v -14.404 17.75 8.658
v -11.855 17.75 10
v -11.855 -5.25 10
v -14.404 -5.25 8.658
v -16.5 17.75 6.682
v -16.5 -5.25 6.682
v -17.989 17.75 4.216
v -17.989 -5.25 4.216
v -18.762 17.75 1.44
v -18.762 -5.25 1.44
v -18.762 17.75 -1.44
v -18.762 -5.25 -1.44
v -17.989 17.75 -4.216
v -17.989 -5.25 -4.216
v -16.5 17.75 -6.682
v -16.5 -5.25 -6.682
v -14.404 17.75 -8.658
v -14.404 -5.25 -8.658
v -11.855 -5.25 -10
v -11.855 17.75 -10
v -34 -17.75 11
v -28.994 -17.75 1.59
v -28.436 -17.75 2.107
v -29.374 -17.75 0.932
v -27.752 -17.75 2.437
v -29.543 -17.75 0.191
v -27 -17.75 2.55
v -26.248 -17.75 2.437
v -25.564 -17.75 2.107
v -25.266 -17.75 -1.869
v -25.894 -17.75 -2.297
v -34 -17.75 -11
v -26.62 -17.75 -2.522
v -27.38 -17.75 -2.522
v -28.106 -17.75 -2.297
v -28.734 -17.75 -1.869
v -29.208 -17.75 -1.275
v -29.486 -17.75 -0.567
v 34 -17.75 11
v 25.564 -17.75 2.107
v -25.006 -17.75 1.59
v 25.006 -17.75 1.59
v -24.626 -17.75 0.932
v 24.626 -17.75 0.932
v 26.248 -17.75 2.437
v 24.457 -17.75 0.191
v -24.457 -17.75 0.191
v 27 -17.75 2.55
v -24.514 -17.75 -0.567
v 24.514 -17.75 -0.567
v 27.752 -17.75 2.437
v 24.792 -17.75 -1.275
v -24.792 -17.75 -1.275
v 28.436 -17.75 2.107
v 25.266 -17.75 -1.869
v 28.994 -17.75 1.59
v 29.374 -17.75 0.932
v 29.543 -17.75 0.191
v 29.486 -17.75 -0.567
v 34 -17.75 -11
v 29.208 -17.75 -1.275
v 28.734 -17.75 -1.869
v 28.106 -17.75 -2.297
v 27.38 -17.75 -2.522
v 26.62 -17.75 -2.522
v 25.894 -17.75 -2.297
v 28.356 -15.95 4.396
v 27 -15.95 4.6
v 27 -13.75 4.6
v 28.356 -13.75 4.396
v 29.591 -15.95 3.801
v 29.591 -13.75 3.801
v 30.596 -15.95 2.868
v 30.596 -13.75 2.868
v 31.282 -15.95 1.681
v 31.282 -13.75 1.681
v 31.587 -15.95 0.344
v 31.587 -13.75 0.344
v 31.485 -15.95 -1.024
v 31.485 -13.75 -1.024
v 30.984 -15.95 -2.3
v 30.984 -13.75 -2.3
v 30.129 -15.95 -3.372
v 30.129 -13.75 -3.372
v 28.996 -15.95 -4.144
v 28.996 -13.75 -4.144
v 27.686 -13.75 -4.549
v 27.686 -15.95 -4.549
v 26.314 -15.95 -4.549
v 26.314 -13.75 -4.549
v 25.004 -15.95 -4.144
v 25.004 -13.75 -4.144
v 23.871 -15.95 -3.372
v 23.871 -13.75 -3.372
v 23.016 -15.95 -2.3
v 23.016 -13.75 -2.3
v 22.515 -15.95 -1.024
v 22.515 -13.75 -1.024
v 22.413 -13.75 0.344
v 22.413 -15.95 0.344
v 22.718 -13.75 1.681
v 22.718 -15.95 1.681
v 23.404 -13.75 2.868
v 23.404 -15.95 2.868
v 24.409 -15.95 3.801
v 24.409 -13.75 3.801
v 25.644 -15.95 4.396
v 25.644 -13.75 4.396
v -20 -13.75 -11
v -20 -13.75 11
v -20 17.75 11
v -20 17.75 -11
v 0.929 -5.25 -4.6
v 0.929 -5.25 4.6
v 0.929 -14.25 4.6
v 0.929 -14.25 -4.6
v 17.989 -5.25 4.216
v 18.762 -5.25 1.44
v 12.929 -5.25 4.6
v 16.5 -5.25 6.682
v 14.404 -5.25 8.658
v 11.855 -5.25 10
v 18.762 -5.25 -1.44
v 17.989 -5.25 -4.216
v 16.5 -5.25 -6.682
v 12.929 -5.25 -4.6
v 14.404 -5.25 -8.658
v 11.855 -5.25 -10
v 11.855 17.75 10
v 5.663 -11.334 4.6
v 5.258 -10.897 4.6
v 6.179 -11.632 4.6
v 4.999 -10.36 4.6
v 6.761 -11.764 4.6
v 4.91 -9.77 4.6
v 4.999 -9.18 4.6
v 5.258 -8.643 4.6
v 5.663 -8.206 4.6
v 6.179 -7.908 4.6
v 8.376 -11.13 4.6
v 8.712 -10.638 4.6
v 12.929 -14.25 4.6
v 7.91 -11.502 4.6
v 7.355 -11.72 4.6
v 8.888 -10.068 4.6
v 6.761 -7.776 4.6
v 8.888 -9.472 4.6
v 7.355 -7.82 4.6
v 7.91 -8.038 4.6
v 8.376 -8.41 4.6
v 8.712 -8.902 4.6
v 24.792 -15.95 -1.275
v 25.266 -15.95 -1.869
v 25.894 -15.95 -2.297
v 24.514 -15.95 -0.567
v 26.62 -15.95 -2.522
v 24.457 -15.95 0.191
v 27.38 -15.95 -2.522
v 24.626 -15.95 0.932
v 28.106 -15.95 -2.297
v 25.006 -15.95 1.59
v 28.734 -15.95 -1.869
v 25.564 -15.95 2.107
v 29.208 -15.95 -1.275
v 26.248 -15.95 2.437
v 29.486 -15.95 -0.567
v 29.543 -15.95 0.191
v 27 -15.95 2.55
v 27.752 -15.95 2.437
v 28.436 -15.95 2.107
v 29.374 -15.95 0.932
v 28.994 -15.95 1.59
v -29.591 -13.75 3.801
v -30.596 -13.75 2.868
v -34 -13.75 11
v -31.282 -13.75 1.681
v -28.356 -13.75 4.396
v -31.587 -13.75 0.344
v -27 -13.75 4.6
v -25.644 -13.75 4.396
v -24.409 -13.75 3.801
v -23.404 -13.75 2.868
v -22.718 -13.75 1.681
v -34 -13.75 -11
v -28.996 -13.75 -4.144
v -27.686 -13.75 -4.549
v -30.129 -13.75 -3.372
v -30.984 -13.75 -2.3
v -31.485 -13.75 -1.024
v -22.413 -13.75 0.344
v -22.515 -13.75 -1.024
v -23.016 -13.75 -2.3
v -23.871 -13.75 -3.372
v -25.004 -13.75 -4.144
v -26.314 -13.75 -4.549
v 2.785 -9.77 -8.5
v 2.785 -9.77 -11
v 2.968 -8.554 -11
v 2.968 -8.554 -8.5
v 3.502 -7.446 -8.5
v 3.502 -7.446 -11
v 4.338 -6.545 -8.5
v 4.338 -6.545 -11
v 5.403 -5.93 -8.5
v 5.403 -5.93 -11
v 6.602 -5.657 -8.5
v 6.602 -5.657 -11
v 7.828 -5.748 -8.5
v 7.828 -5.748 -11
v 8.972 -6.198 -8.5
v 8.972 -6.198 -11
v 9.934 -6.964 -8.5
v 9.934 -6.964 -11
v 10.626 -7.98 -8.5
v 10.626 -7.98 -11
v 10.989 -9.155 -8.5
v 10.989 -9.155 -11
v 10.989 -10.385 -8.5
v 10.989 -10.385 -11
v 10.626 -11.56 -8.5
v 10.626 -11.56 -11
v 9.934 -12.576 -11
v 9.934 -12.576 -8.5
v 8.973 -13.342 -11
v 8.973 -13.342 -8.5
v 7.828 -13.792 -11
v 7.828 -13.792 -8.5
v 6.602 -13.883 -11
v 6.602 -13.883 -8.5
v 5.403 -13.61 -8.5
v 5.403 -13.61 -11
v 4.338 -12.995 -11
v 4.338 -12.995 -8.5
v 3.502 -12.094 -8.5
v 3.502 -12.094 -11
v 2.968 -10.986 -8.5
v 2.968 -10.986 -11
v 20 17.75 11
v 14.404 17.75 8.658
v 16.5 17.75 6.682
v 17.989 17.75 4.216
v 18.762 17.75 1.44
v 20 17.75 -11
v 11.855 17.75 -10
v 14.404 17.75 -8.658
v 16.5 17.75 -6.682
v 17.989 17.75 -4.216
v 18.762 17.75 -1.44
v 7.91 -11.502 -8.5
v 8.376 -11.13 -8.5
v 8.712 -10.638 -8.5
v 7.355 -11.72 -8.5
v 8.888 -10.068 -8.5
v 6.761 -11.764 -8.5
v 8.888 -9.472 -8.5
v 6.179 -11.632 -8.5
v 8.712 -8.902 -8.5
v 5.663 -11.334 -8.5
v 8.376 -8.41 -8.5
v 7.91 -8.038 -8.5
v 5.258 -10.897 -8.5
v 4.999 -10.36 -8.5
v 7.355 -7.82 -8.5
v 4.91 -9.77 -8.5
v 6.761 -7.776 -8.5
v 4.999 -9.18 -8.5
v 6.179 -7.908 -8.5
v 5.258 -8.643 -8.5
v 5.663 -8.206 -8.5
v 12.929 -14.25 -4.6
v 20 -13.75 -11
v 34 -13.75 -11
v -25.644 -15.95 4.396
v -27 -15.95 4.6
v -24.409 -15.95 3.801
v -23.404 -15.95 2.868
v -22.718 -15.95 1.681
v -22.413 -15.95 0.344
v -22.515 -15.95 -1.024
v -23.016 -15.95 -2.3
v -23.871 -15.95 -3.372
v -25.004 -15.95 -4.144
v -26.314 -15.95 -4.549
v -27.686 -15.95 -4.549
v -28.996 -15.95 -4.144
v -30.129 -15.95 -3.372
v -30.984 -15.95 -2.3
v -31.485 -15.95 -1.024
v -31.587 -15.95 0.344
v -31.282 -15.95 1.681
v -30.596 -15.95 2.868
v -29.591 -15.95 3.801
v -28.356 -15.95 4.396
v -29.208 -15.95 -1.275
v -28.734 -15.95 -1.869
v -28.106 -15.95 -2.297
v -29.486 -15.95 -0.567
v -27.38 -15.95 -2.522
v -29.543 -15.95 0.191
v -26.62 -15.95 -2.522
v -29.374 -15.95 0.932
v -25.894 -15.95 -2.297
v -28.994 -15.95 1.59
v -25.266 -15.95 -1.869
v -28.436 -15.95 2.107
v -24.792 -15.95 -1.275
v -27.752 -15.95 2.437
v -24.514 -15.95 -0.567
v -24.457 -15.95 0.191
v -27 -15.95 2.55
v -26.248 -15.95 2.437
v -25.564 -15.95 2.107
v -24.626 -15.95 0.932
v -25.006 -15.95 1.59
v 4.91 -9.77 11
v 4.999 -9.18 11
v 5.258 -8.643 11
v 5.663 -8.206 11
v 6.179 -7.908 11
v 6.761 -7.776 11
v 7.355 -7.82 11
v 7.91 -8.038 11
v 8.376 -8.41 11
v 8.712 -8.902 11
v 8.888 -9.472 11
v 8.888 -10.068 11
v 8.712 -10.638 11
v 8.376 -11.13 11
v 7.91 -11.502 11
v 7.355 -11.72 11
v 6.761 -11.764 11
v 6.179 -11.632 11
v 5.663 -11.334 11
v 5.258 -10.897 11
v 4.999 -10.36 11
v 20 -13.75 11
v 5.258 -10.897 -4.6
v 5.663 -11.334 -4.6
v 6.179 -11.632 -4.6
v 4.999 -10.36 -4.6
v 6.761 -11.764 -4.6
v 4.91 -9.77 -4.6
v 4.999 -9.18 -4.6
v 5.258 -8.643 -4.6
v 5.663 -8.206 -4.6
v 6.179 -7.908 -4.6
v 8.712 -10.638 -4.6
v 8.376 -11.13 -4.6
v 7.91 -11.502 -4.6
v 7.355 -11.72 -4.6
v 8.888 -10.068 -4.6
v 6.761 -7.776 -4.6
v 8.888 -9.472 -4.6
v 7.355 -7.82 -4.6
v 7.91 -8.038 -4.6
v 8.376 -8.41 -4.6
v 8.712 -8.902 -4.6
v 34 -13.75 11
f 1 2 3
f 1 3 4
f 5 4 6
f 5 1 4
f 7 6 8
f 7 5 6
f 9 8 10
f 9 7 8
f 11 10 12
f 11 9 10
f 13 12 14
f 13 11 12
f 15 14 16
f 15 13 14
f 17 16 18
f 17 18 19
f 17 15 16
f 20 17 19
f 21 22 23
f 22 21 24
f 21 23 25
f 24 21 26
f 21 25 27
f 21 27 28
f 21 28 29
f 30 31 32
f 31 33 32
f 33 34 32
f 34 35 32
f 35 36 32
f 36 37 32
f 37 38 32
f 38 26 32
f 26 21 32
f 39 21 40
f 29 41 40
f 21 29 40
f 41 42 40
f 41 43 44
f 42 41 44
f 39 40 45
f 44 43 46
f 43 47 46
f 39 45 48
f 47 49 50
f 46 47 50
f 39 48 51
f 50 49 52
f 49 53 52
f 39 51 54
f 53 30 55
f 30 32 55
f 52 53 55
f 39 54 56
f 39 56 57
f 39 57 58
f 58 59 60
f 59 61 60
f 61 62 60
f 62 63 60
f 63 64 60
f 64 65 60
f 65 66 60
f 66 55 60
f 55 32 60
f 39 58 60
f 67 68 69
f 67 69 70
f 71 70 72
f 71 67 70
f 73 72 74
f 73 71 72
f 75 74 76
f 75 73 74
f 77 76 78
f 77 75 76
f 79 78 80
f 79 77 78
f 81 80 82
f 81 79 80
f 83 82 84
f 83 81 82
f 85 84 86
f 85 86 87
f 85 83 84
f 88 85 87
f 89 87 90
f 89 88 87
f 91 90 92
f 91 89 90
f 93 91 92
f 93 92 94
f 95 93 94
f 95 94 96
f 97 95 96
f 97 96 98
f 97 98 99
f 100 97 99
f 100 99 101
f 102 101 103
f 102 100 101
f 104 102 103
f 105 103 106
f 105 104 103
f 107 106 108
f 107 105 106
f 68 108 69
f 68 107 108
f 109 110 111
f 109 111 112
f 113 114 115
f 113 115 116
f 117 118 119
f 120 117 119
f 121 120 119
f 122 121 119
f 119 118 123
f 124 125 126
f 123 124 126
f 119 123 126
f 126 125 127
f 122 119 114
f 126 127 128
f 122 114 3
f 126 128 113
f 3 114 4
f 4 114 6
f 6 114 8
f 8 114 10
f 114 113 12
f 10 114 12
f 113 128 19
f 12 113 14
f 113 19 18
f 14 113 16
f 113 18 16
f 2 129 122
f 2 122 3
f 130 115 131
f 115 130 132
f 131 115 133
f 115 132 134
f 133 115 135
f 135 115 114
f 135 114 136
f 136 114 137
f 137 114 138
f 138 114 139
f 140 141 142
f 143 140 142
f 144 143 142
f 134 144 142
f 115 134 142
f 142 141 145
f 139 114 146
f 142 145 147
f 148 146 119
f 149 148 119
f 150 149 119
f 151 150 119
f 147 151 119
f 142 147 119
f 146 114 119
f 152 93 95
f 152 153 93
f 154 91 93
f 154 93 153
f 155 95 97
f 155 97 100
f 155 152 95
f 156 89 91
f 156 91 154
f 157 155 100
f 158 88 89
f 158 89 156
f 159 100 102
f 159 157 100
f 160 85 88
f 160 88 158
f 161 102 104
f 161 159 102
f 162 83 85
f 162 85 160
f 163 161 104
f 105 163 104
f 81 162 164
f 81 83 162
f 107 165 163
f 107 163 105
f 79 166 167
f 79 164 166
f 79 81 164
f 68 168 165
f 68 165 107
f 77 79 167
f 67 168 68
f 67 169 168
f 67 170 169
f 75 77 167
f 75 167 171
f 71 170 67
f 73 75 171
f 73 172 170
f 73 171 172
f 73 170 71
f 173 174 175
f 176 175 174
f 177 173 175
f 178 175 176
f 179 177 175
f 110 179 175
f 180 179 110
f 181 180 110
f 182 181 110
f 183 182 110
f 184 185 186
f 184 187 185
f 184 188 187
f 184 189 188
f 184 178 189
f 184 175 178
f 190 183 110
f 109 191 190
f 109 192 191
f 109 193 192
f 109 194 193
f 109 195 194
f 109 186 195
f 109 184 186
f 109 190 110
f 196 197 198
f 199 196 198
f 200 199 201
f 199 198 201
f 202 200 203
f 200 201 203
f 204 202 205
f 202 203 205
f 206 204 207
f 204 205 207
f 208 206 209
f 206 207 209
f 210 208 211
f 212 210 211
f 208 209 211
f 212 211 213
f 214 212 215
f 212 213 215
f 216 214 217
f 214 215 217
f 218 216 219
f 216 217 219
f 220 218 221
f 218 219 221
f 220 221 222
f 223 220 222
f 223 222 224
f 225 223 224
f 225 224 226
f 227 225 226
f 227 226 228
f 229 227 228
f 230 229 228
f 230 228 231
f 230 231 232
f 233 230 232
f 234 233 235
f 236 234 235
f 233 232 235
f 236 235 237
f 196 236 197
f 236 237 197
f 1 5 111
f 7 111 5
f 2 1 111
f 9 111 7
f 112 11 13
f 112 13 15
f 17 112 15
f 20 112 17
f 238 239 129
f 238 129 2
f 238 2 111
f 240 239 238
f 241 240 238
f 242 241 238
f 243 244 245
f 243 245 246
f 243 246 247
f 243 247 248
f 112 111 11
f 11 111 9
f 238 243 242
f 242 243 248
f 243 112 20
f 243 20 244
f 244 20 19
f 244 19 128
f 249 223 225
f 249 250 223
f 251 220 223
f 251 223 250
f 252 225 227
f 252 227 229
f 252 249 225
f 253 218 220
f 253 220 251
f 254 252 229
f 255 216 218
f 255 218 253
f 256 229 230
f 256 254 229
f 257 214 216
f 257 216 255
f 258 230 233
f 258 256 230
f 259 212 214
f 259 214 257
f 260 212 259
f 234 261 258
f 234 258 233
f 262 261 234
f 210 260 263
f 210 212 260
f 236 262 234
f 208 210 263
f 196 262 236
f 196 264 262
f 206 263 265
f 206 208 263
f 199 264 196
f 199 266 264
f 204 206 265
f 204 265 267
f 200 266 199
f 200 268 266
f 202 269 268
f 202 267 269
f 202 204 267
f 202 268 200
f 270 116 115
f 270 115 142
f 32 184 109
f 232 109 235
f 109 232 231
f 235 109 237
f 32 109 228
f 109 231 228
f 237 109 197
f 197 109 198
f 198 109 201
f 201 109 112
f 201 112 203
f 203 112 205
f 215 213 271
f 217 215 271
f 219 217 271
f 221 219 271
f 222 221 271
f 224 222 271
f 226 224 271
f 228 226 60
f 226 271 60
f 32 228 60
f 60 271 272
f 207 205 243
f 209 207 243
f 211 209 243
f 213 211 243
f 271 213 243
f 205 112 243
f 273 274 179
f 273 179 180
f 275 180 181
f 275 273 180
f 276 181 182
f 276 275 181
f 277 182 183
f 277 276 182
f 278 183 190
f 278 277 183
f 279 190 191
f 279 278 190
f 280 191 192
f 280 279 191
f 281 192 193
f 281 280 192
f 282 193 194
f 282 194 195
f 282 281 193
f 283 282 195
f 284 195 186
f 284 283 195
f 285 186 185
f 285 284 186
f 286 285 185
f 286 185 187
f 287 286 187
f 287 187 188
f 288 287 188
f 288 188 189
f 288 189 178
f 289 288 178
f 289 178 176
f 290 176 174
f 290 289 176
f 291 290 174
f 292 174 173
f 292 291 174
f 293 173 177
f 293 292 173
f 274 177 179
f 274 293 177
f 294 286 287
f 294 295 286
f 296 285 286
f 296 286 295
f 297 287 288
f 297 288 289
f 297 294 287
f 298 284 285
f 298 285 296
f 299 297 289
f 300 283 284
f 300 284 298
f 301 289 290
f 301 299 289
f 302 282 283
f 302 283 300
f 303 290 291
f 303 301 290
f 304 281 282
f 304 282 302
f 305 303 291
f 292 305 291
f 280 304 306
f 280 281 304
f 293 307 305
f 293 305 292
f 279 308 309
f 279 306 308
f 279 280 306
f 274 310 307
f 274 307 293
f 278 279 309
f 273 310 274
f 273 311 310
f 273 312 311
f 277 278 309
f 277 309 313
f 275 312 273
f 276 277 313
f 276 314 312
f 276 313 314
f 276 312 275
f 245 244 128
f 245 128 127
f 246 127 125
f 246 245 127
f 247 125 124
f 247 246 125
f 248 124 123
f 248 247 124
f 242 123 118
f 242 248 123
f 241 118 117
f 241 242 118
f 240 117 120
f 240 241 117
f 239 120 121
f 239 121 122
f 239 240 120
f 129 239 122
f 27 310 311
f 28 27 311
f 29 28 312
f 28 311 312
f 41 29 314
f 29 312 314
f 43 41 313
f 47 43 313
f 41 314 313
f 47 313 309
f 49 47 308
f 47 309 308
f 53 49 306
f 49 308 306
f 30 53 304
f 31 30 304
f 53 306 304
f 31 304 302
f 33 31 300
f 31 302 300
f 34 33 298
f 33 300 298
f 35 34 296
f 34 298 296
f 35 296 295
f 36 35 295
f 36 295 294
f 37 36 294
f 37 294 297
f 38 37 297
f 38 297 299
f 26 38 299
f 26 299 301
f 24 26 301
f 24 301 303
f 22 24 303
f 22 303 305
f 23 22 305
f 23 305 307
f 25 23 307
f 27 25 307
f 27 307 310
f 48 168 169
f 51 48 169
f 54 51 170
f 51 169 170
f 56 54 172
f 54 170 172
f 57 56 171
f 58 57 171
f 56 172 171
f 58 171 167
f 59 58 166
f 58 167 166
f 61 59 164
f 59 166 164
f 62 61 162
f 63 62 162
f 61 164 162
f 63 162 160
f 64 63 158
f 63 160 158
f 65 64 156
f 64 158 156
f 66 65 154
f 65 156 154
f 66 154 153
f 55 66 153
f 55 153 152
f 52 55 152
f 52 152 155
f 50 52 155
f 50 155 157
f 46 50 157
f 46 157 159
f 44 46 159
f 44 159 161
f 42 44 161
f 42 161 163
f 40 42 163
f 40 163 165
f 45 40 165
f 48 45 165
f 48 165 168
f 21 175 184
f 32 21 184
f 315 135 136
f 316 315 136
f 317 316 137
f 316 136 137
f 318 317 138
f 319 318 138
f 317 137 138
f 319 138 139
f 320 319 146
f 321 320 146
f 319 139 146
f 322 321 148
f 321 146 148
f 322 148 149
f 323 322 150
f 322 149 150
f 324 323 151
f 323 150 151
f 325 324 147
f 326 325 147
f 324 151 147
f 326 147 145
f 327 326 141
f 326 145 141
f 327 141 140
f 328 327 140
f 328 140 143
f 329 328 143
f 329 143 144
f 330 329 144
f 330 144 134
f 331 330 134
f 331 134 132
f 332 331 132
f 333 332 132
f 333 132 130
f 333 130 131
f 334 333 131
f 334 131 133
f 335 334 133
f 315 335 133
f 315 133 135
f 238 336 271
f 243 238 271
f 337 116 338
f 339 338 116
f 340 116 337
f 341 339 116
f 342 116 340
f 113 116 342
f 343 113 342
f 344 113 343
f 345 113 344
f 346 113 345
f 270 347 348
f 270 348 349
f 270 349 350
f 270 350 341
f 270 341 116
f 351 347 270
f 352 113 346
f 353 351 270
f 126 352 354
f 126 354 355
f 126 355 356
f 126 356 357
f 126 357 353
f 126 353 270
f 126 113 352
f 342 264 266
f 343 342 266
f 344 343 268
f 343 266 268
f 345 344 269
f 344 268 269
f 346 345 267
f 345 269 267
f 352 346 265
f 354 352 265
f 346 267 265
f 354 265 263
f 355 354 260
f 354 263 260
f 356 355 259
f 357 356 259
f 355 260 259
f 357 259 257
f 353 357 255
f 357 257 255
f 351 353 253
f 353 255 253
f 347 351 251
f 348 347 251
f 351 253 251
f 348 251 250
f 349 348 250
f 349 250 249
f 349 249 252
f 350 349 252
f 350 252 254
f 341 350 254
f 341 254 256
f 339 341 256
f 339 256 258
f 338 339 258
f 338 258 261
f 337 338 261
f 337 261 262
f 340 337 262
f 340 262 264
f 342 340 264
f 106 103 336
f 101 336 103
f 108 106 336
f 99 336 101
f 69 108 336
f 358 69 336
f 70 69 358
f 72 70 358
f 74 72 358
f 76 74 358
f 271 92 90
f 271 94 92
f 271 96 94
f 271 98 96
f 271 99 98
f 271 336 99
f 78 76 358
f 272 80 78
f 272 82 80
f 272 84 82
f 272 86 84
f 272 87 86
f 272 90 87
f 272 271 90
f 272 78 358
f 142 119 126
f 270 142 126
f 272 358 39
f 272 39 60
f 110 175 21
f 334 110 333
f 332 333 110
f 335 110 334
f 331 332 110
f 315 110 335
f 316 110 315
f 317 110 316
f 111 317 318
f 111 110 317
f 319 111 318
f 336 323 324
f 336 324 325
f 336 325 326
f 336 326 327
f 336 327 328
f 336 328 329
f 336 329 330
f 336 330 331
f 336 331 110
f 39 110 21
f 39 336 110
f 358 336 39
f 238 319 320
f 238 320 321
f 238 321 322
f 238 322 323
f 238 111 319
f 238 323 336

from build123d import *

# Parameters (mm, degrees)
SKETCH1_W           = 14
SKETCH1_H           = 22
SKETCH1_R           = 4.6
SKETCH1_R_2         = 2.55
SKETCH1_W_2         = 40
SKETCH1_W_3         = 12
SKETCH1_H_2         = 9.2
BOSS_EXTRUDE1_DEPTH = 17.75
CUT_EXTRUDE1_START  = -13.75
SKETCH1_5_W         = 14
SKETCH1_5_H         = 22
SKETCH1_5_R         = 4.6
SKETCH1_5_R_2       = 2.55
CUT_EXTRUDE1_DEPTH  = 31.5
CUT_EXTRUDE2_START  = -15.95
SKETCH1_6_R         = 4.6
SKETCH1_6_R_2       = 2.55
CUT_EXTRUDE2_DEPTH  = 2.2
CUT_EXTRUDE3_START  = 17.75
SKETCH1_7_W         = 12
SKETCH1_7_H         = 9.2
CUT_EXTRUDE3_DEPTH  = 23
CUT_EXTRUDE4_START  = -5.25
SKETCH1_8_W         = 12
SKETCH1_8_H         = 9.2
CUT_EXTRUDE4_DEPTH  = 9
CUT_EXTRUDE5_REACH  = 46.216
SKETCH2_R           = 2
SKETCH2_3_R         = 4.125
CUT_EXTRUDE6_DEPTH  = 2.5


with BuildPart() as part:
    # Sketch1 → Boss-Extrude1 (new, symmetric)
    # profile 1 of 7: a face of its own
    with BuildSketch(Plane(origin=(0, 0, 0), x_dir=(1, 0, 0), z_dir=(0, 1, 0))):
        with Locations((-27, 0)):
            Rectangle(SKETCH1_W, SKETCH1_H)
        with Locations((-27, 0)):
            Circle(SKETCH1_R, mode=Mode.SUBTRACT)
    # profile 2 of 7: a face of its own
    with BuildSketch(Plane(origin=(0, 0, 0), x_dir=(1, 0, 0), z_dir=(0, 1, 0))):
        with Locations((-27, 0)):
            Circle(SKETCH1_R)
        with Locations(Location((-27, 0, 0), (0, 0, 270))):
            Circle(SKETCH1_R_2, mode=Mode.SUBTRACT)
    # profile 3 of 7: a face of its own
    with BuildSketch(Plane(origin=(0, 0, 0), x_dir=(1, 0, 0), z_dir=(0, 1, 0))):
        Rectangle(SKETCH1_W_2, SKETCH1_H)
        with BuildLine():
            Line((11.854501341, -10), (-11.854501341, -10))
            ThreePointArc((-11.854501341, -10), (-18.86, 0), (-11.854501341, 10))
            Line((-11.854501341, 10), (11.854501341, 10))
            ThreePointArc((11.854501341, 10), (18.86, 0), (11.854501341, -10))
        make_face(mode=Mode.SUBTRACT)
    # profile 4 of 7: a face of its own
    with BuildSketch(Plane(origin=(0, 0, 0), x_dir=(1, 0, 0), z_dir=(0, 1, 0))):
        with BuildLine():
            ThreePointArc((11.854501341, 10), (18.86, 0), (11.854501341, -10))
            Line((11.854501341, -10), (-11.854501341, -10))
            ThreePointArc((-11.854501341, -10), (-18.86, 0), (-11.854501341, 10))
            Line((-11.854501341, 10), (11.854501341, 10))
        make_face()
        with Locations((6.92918915, 0)):
            Rectangle(SKETCH1_W_3, SKETCH1_H_2, mode=Mode.SUBTRACT)
    # profile 5 of 7: a face of its own
    with BuildSketch(Plane(origin=(0, 0, 0), x_dir=(1, 0, 0), z_dir=(0, 1, 0))):
        with Locations((6.92918915, 0)):
            Rectangle(SKETCH1_W_3, SKETCH1_H_2)
    # profile 6 of 7: a face of its own
    with BuildSketch(Plane(origin=(0, 0, 0), x_dir=(1, 0, 0), z_dir=(0, 1, 0))):
        with Locations((27, 0)):
            Rectangle(SKETCH1_W, SKETCH1_H)
        with Locations((27, 0)):
            Circle(SKETCH1_R, mode=Mode.SUBTRACT)
    # profile 7 of 7: a face of its own
    with BuildSketch(Plane(origin=(0, 0, 0), x_dir=(1, 0, 0), z_dir=(0, 1, 0))):
        with Locations((27, 0)):
            Circle(SKETCH1_R)
        with Locations(Location((27, 0, 0), (0, 0, 270))):
            Circle(SKETCH1_R_2, mode=Mode.SUBTRACT)
    extrude(amount=BOSS_EXTRUDE1_DEPTH, both=True)

    # Sketch1<5> → Cut-Extrude1 (cut)
    # profile 1 of 4: a face of its own
    with BuildSketch(Plane(origin=(0, 0, 0), x_dir=(1, 0, 0), z_dir=(0, 1, 0)).offset(CUT_EXTRUDE1_START)):
        with Locations((-27, 0)):
            Rectangle(SKETCH1_5_W, SKETCH1_5_H)
        with Locations((-27, 0)):
            Circle(SKETCH1_5_R, mode=Mode.SUBTRACT)
    # profile 2 of 4: a face of its own
    with BuildSketch(Plane(origin=(0, 0, 0), x_dir=(1, 0, 0), z_dir=(0, 1, 0)).offset(CUT_EXTRUDE1_START)):
        with Locations((27, 0)):
            Rectangle(SKETCH1_5_W, SKETCH1_5_H)
        with Locations((27, 0)):
            Circle(SKETCH1_5_R, mode=Mode.SUBTRACT)
    # profile 3 of 4: a face of its own
    with BuildSketch(Plane(origin=(0, 0, 0), x_dir=(1, 0, 0), z_dir=(0, 1, 0)).offset(CUT_EXTRUDE1_START)):
        with Locations((-27, 0)):
            Circle(SKETCH1_5_R)
        with Locations(Location((-27, 0, 0), (0, 0, 270))):
            Circle(SKETCH1_5_R_2, mode=Mode.SUBTRACT)
    # profile 4 of 4: a face of its own
    with BuildSketch(Plane(origin=(0, 0, 0), x_dir=(1, 0, 0), z_dir=(0, 1, 0)).offset(CUT_EXTRUDE1_START)):
        with Locations((27, 0)):
            Circle(SKETCH1_5_R)
        with Locations(Location((27, 0, 0), (0, 0, 270))):
            Circle(SKETCH1_5_R_2, mode=Mode.SUBTRACT)
    extrude(amount=CUT_EXTRUDE1_DEPTH, mode=Mode.SUBTRACT)

    # Sketch1<6> → Cut-Extrude2 (cut)
    # profile 1 of 2: a face of its own
    with BuildSketch(Plane(origin=(0, 0, 0), x_dir=(1, 0, 0), z_dir=(0, 1, 0)).offset(CUT_EXTRUDE2_START)):
        with Locations(Location((-27, 0, 0), (0, 0, 270))):
            Circle(SKETCH1_6_R)
        with Locations(Location((-27, 0, 0), (0, 0, 270))):
            Circle(SKETCH1_6_R_2, mode=Mode.SUBTRACT)
    # profile 2 of 2: a face of its own
    with BuildSketch(Plane(origin=(0, 0, 0), x_dir=(1, 0, 0), z_dir=(0, 1, 0)).offset(CUT_EXTRUDE2_START)):
        with Locations(Location((27, 0, 0), (0, 0, 270))):
            Circle(SKETCH1_6_R)
        with Locations(Location((27, 0, 0), (0, 0, 270))):
            Circle(SKETCH1_6_R_2, mode=Mode.SUBTRACT)
    extrude(amount=CUT_EXTRUDE2_DEPTH, mode=Mode.SUBTRACT)

    # Sketch1<7> → Cut-Extrude3 (cut)
    # profile 1 of 2: a face of its own
    with BuildSketch(Plane(origin=(0, 0, 0), x_dir=(1, 0, 0), z_dir=(0, 1, 0)).offset(CUT_EXTRUDE3_START)):
        with BuildLine():
            ThreePointArc((11.854501341, 10), (18.86, 0), (11.854501341, -10))
            Line((11.854501341, -10), (-11.854501341, -10))
            ThreePointArc((-11.854501341, -10), (-18.86, 0), (-11.854501341, 10))
            Line((-11.854501341, 10), (11.854501341, 10))
        make_face()
        with Locations((6.92918915, 0)):
            Rectangle(SKETCH1_7_W, SKETCH1_7_H, mode=Mode.SUBTRACT)
    # profile 2 of 2: a face of its own
    with BuildSketch(Plane(origin=(0, 0, 0), x_dir=(1, 0, 0), z_dir=(0, 1, 0)).offset(CUT_EXTRUDE3_START)):
        with Locations((6.92918915, 0)):
            Rectangle(SKETCH1_7_W, SKETCH1_7_H)
    extrude(amount=-CUT_EXTRUDE3_DEPTH, mode=Mode.SUBTRACT)

    # Sketch1<8> → Cut-Extrude4 (cut)
    with BuildSketch(Plane(origin=(0, 0, 0), x_dir=(1, 0, 0), z_dir=(0, 1, 0)).offset(CUT_EXTRUDE4_START)):
        with Locations((6.92918915, 0)):
            Rectangle(SKETCH1_8_W, SKETCH1_8_H)
    extrude(amount=-CUT_EXTRUDE4_DEPTH, mode=Mode.SUBTRACT)

    # Cut-Extrude5: up to this face of the body (flat: up to its plane)
    cut_extrude5_end = Plane(part.part.faces().sort_by_distance((0, -1.151436031, 11))[0])
    # Sketch2 → Cut-Extrude5 (cut, up to the picked face)
    with BuildSketch(Plane(origin=(0, 0, -11), x_dir=(-1, 0, 0), z_dir=(0, 0, -1)), mode=Mode.PRIVATE) as cut_extrude5_sk1:
        with Locations((-6.91, -9.77)):
            Circle(SKETCH2_R)
    cut_extrude5_tool1 = split(extrude(cut_extrude5_sk1.sketch, amount=-CUT_EXTRUDE5_REACH, mode=Mode.PRIVATE), bisect_by=cut_extrude5_end, keep=Keep.BOTH, mode=Mode.PRIVATE)
    add(cut_extrude5_tool1.solids().sort_by(Axis((6.91, -9.77, -11), (0, 0, 1)))[0], mode=Mode.SUBTRACT)

    # Sketch2<3> → Cut-Extrude6 (cut)
    with BuildSketch(Plane(origin=(0, 0, -11), x_dir=(-1, 0, 0), z_dir=(0, 0, -1))):
        with Locations((-6.91, -9.77)):
            Circle(SKETCH2_3_R)
    extrude(amount=-CUT_EXTRUDE6_DEPTH, mode=Mode.SUBTRACT)


solid = part.part
